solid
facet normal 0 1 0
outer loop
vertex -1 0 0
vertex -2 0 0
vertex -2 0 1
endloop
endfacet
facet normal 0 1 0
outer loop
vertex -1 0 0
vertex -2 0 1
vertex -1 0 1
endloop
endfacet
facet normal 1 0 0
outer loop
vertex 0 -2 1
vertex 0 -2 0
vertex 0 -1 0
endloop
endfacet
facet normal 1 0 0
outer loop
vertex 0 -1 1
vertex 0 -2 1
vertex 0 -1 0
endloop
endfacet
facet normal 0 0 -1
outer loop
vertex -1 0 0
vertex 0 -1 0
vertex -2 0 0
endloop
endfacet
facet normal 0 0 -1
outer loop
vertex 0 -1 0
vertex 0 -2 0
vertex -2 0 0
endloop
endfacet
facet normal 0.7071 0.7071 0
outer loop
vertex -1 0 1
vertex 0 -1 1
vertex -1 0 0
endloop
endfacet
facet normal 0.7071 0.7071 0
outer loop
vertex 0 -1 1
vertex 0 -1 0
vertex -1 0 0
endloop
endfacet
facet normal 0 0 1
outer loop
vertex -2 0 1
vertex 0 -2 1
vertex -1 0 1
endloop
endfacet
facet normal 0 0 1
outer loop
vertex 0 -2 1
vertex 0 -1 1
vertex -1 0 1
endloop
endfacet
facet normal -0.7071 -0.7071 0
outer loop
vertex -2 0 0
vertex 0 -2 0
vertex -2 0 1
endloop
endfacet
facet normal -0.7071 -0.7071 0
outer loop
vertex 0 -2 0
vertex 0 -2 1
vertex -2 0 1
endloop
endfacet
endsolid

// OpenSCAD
rotate_extrude(angle=90, $fn=3) translate([-2,0]) square([1,1]);
